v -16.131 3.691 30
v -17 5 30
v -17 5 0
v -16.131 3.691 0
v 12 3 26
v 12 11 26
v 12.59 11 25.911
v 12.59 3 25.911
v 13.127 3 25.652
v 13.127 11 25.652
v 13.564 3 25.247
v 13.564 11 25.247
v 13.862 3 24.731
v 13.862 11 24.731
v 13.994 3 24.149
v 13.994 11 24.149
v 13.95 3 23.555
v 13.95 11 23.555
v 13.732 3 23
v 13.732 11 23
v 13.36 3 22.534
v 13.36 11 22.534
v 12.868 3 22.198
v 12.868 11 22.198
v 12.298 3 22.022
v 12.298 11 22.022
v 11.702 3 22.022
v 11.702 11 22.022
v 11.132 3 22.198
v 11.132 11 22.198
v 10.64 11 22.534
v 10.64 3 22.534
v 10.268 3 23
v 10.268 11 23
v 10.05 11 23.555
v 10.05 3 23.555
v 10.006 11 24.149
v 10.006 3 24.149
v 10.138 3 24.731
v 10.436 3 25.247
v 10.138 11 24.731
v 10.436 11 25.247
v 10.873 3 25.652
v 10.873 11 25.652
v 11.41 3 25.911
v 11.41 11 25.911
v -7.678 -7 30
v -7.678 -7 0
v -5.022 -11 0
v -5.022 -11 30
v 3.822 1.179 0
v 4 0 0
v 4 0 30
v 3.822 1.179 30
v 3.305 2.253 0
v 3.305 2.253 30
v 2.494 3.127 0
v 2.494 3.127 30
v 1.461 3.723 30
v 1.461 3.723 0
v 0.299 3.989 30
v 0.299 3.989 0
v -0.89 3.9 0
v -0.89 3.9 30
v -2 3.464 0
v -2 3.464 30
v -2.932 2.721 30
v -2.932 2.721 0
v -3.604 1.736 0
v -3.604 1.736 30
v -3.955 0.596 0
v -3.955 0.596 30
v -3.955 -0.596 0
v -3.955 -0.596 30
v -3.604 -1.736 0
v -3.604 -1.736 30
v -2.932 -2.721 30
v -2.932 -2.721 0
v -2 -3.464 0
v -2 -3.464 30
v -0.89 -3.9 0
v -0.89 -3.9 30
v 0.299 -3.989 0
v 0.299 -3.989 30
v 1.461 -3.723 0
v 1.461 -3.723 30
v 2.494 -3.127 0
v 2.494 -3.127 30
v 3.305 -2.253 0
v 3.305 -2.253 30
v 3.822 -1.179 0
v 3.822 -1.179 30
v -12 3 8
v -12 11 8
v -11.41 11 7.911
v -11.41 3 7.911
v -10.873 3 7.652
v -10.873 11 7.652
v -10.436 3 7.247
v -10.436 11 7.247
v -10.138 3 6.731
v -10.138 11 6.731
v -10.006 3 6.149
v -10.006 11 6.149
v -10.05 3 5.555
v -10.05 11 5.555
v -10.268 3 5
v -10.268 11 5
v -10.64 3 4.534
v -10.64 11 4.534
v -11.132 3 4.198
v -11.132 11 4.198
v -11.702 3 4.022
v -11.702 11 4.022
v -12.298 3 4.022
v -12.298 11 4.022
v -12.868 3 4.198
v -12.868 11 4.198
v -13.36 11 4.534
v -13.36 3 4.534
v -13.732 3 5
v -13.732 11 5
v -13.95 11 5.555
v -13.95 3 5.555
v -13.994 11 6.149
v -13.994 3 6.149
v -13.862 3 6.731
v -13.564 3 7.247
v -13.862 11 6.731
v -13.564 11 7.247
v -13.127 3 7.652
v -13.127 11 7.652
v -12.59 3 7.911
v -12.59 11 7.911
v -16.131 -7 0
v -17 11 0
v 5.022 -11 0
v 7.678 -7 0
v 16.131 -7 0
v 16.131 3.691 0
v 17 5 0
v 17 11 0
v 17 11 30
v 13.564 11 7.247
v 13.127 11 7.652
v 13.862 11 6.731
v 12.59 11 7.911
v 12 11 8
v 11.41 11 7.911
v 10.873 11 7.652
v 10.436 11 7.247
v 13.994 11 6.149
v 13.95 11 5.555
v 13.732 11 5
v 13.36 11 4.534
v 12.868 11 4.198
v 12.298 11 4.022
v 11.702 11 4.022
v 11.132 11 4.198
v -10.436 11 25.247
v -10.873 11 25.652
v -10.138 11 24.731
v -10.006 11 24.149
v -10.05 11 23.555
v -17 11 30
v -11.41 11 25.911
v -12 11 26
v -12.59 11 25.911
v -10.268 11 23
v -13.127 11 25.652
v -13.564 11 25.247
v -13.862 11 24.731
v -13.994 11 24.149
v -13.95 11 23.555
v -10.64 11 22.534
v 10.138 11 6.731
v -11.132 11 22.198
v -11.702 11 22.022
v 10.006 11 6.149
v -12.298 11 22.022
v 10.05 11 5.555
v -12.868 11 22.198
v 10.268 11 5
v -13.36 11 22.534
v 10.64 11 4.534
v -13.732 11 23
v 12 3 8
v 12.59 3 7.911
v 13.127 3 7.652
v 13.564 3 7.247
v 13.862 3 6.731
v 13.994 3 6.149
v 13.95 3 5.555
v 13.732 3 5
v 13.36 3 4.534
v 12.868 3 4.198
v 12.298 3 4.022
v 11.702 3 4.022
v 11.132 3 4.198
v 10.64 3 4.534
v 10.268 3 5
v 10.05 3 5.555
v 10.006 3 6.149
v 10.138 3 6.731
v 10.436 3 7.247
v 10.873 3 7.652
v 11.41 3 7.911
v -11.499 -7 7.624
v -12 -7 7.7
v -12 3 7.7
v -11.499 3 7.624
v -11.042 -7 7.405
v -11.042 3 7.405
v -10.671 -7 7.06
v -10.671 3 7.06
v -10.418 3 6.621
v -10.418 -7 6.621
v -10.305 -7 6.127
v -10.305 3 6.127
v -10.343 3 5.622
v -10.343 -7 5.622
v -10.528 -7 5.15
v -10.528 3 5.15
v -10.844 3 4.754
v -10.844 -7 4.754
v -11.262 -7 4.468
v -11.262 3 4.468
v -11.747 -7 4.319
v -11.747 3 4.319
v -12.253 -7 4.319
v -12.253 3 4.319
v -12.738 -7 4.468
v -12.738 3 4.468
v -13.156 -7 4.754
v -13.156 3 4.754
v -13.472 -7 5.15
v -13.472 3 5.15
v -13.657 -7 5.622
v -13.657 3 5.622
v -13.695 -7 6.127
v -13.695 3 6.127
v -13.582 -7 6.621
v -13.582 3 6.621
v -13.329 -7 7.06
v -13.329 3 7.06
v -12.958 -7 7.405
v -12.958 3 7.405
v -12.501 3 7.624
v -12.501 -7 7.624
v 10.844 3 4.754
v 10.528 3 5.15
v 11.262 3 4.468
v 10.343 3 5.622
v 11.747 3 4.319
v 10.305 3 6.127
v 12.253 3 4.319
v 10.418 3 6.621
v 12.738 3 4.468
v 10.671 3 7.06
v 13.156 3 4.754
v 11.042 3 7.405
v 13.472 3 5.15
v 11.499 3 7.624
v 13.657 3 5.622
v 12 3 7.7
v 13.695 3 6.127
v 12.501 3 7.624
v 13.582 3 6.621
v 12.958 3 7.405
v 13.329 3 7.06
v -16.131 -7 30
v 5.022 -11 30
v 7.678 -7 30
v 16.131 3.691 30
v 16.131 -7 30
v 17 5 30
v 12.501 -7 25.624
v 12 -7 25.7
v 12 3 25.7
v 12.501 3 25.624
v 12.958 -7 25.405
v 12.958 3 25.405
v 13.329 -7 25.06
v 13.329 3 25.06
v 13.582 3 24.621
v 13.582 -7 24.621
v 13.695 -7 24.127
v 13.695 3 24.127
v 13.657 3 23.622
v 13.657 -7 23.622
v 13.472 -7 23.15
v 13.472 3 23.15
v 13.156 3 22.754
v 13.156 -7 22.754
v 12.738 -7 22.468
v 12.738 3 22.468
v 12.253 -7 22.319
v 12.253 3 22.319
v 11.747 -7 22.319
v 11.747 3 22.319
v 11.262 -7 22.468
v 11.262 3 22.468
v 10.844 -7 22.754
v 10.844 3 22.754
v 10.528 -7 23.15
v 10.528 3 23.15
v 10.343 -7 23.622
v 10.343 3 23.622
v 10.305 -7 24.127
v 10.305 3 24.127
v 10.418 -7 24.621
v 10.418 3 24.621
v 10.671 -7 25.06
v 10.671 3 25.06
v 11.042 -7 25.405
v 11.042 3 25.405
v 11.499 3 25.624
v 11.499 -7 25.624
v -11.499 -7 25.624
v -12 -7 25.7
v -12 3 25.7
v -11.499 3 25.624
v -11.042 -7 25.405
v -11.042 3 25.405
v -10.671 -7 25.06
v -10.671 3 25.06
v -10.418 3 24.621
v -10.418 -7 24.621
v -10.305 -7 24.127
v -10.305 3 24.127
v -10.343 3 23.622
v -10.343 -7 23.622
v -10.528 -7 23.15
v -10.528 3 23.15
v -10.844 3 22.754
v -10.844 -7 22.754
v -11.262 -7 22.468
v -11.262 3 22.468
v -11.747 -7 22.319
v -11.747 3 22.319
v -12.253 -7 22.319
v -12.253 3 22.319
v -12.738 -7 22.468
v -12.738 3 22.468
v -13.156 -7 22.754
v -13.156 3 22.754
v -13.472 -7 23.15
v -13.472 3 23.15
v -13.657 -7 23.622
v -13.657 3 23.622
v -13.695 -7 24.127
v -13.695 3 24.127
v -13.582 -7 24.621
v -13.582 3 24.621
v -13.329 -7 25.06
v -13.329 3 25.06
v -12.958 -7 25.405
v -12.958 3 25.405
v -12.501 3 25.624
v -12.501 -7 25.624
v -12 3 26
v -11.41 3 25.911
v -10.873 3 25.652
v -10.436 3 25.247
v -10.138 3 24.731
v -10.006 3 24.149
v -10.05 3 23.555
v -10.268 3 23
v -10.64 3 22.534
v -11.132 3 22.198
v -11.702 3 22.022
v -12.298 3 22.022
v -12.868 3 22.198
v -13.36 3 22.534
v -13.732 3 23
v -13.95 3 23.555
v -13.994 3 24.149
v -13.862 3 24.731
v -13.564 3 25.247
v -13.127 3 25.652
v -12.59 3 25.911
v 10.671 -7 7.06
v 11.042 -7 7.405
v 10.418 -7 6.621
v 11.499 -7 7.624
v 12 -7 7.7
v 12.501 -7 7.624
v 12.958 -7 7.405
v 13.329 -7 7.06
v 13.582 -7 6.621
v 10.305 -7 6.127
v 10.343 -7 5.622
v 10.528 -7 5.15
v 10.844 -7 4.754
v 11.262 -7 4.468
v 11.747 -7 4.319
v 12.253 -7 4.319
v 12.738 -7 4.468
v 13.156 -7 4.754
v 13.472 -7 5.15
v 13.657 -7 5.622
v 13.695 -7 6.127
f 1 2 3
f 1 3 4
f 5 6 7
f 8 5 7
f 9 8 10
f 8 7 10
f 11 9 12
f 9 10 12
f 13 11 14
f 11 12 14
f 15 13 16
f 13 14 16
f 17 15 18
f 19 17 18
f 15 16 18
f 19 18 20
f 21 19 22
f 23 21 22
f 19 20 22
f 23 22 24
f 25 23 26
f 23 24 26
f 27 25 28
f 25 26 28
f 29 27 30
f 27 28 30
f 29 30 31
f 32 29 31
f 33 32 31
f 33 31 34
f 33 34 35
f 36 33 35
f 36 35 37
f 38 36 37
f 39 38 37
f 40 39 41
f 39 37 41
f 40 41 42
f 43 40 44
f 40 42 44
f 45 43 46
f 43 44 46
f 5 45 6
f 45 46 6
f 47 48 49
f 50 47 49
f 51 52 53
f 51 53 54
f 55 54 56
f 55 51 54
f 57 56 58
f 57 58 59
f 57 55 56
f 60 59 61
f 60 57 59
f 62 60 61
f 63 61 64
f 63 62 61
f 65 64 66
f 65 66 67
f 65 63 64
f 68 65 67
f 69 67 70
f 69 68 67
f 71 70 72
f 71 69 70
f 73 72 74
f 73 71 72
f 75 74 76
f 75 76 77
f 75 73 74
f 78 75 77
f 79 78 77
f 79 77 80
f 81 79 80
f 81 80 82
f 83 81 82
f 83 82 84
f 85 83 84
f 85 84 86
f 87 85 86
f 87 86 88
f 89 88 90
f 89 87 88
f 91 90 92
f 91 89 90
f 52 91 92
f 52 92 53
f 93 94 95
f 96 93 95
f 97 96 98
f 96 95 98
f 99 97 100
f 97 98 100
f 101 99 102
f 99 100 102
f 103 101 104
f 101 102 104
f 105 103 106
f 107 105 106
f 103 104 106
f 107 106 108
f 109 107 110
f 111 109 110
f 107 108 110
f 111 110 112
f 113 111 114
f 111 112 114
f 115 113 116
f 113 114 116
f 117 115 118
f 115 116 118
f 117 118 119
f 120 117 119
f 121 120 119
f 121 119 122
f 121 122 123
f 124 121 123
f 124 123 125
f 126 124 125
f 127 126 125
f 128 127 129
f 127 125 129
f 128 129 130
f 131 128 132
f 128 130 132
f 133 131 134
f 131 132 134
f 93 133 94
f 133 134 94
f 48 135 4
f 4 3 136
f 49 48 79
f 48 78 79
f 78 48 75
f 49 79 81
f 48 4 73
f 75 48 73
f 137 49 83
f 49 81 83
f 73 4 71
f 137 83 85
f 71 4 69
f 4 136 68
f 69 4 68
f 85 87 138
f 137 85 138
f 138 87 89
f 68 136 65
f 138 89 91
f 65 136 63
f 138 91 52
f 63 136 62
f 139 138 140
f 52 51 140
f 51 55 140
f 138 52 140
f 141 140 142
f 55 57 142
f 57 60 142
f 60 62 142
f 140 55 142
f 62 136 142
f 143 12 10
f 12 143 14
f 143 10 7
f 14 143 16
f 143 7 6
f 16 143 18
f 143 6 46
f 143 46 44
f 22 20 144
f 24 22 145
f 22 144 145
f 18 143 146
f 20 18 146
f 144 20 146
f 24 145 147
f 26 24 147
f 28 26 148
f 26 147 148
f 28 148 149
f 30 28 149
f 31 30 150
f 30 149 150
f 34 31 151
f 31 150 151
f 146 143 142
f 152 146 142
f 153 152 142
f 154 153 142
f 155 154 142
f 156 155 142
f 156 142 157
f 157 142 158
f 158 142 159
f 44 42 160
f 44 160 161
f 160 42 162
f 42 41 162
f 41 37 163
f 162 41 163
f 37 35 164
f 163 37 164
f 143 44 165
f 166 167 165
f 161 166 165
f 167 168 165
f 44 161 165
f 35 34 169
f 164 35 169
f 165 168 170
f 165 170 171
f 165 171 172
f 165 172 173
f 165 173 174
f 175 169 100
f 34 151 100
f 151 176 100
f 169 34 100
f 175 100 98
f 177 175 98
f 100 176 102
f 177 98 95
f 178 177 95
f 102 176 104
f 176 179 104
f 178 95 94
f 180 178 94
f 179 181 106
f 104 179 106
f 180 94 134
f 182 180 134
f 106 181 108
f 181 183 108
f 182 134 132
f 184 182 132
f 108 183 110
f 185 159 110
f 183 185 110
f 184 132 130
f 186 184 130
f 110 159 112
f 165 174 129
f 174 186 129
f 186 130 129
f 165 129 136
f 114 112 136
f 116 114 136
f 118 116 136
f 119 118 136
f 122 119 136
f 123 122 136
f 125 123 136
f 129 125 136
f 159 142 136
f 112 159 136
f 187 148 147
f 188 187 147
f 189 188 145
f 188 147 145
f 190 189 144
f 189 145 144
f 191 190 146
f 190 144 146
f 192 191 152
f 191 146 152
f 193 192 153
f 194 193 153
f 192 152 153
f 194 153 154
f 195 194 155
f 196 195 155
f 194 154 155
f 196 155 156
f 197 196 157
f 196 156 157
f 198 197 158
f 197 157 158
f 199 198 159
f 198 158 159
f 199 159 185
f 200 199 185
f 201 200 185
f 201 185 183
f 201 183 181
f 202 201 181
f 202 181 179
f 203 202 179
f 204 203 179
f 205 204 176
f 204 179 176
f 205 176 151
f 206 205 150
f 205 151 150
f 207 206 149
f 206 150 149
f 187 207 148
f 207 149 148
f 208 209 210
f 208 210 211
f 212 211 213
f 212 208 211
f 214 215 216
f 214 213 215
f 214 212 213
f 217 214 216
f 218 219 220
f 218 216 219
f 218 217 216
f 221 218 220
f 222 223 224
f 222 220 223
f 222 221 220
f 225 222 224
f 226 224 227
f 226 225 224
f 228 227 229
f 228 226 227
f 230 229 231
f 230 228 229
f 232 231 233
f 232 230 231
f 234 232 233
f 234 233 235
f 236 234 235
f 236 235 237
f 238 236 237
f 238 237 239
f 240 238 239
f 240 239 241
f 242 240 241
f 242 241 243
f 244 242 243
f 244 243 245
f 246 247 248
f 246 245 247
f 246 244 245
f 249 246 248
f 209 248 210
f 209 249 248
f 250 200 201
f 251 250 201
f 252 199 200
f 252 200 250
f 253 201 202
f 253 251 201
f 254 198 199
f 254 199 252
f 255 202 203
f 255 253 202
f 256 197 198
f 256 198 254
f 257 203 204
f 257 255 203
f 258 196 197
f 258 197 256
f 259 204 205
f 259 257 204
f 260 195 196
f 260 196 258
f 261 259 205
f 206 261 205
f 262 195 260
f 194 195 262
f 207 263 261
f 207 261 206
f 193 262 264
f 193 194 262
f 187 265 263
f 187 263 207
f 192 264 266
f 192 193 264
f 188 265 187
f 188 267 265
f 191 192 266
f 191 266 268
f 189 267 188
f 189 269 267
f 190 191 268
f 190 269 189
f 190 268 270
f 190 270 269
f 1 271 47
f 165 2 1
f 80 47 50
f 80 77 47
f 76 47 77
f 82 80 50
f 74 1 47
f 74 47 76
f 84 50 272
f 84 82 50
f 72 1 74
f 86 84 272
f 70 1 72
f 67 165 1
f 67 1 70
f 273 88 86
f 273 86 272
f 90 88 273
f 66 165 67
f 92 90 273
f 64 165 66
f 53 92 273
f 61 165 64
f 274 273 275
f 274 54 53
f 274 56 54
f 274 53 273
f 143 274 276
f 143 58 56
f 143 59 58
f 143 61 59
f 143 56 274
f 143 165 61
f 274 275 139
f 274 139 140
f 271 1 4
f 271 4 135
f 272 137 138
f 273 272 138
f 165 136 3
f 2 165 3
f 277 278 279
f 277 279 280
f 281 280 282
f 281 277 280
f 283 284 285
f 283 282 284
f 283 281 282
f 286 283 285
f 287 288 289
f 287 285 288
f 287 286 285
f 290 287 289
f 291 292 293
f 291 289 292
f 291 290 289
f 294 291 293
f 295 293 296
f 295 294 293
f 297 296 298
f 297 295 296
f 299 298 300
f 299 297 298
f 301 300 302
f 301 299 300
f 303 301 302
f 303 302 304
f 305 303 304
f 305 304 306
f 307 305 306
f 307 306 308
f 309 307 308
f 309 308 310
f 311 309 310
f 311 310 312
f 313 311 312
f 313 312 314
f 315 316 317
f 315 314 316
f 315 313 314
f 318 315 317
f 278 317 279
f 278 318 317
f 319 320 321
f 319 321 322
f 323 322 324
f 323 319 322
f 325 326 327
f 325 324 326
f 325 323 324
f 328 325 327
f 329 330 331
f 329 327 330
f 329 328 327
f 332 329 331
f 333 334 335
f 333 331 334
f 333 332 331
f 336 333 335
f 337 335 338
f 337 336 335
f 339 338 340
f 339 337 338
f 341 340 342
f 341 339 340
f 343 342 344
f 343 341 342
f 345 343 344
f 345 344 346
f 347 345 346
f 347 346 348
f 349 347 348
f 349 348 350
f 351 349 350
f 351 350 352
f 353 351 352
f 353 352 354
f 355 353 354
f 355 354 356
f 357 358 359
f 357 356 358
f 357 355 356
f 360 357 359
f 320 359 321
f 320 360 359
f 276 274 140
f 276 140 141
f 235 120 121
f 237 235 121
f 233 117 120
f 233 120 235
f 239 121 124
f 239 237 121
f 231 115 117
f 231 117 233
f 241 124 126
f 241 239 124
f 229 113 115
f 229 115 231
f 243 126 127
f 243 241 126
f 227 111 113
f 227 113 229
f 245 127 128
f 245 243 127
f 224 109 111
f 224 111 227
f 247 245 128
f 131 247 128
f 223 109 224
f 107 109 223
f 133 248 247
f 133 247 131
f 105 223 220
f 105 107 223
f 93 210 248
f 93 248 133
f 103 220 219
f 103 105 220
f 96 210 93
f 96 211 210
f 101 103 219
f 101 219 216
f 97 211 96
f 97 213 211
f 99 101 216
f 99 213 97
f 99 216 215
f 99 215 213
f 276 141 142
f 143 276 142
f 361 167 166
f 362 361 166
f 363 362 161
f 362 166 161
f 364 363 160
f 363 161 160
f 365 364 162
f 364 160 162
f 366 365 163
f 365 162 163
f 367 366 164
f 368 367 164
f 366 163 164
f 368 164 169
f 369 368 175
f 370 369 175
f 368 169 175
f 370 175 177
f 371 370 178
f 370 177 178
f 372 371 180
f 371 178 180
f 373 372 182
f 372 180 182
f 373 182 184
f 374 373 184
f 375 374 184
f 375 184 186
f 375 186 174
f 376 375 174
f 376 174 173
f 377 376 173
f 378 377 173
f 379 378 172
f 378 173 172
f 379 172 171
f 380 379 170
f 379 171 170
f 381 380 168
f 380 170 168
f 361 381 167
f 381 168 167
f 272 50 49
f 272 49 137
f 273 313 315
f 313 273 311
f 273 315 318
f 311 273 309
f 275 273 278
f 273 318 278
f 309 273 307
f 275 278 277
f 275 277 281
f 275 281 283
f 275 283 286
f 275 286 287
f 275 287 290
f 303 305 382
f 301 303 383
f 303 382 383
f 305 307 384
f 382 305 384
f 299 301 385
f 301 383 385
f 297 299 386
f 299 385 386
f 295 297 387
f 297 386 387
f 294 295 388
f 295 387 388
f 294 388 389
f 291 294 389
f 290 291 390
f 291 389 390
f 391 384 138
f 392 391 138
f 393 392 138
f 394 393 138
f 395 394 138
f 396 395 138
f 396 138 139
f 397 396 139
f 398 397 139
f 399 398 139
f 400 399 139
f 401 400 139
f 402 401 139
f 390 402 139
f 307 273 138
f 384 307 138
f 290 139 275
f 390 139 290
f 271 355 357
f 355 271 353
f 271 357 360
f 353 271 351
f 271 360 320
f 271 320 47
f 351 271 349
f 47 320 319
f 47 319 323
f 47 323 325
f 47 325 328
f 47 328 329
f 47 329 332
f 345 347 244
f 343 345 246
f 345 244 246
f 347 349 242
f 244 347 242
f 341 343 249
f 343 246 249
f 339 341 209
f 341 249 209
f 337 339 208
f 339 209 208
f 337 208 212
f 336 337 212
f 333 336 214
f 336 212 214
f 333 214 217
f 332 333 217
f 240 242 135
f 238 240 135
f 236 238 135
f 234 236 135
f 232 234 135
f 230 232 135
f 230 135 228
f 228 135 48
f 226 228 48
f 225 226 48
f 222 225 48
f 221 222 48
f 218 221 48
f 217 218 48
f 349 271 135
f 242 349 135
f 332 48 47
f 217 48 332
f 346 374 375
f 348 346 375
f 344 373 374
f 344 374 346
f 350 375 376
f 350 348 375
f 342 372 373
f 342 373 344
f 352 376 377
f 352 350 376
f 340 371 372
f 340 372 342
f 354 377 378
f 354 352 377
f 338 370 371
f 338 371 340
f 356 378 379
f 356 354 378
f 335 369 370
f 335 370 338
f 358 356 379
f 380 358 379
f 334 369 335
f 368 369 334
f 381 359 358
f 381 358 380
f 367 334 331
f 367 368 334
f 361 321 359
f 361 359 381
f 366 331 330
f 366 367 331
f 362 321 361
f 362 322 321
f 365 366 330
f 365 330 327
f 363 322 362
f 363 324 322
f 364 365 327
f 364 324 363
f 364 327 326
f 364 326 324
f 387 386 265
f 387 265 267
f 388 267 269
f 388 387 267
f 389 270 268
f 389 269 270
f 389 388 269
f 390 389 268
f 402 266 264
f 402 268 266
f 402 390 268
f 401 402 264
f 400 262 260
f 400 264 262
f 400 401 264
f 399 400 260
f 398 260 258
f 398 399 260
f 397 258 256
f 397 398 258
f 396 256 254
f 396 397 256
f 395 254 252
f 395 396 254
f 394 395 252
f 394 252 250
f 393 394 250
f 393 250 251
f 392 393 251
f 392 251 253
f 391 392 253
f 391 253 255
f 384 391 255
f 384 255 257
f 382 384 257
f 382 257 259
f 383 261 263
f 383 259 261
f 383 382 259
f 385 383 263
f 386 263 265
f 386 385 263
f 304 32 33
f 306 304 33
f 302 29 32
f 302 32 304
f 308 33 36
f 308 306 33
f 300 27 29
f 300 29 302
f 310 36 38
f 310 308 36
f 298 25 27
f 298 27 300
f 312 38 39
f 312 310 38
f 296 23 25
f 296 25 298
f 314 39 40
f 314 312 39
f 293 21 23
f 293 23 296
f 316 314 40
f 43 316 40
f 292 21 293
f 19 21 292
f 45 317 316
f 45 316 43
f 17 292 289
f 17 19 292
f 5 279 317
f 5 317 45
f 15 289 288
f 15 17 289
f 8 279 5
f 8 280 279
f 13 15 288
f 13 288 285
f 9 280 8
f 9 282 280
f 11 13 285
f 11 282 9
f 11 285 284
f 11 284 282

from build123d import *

# Parameters (mm, degrees)
SKETCH_1_R               = 4
EXTRUDE_1_DEPTH          = 30
SKETCH_2_R               = 2
CUT_EXTRUDE_1_DEPTH      = 8
CUT_EXTRUDE_2_DEPTH      = 41.902322672
CUT_EXTRUDE_2_DEPTH_BACK = 41.902322672
SKETCH_4_R               = 1.7


with BuildPart() as part:
    # 草图1 → 凸台-拉伸1 (new body)
    with BuildSketch(Plane.XY):
        Polygon((17, 11), (-17, 11), (-17, 5), (-16.130865539, 3.691288487), (-16.130865539, -7), (-7.678245569, -7), (-5.021787053, -11), (5.021787053, -11), (7.678245569, -7), (16.130865539, -7), (16.130865539, 3.691288487), (17, 5), align=None)
        Circle(SKETCH_1_R, mode=Mode.SUBTRACT)
    extrude(amount=EXTRUDE_1_DEPTH)

    # 草图2 → 切除-拉伸1 (cut)
    with BuildSketch(Plane(origin=(0, 11, 0), x_dir=(1, 0, 0), z_dir=(0, 1, 0))):
        with Locations(Location((-12, -6, 0), (0, 0, 270))):
            Circle(SKETCH_2_R)
        with Locations(Location((-12, -24, 0), (0, 0, 270))):
            Circle(SKETCH_2_R)
        with Locations(Location((12, -6, 0), (0, 0, 270))):
            Circle(SKETCH_2_R)
        with Locations(Location((12, -24, 0), (0, 0, 270))):
            Circle(SKETCH_2_R)
    extrude(amount=-CUT_EXTRUDE_1_DEPTH, mode=Mode.SUBTRACT)

    # 草图4 → 切除-拉伸2 (cut, two sides: drawn at the far end of the back side and taken through both)
    with BuildSketch(Plane(origin=(0, 11, 0), x_dir=(1, 0, 0), z_dir=(0, 1, 0)).offset(-CUT_EXTRUDE_2_DEPTH_BACK)):
        with Locations(Location((-12, -6, 0), (0, 0, 270))):
            Circle(SKETCH_4_R)
        with Locations(Location((-12, -24, 0), (0, 0, 270))):
            Circle(SKETCH_4_R)
        with Locations(Location((12, -6, 0), (0, 0, 270))):
            Circle(SKETCH_4_R)
        with Locations(Location((12, -24, 0), (0, 0, 270))):
            Circle(SKETCH_4_R)
    extrude(amount=CUT_EXTRUDE_2_DEPTH + CUT_EXTRUDE_2_DEPTH_BACK, mode=Mode.SUBTRACT)


solid = part.part
